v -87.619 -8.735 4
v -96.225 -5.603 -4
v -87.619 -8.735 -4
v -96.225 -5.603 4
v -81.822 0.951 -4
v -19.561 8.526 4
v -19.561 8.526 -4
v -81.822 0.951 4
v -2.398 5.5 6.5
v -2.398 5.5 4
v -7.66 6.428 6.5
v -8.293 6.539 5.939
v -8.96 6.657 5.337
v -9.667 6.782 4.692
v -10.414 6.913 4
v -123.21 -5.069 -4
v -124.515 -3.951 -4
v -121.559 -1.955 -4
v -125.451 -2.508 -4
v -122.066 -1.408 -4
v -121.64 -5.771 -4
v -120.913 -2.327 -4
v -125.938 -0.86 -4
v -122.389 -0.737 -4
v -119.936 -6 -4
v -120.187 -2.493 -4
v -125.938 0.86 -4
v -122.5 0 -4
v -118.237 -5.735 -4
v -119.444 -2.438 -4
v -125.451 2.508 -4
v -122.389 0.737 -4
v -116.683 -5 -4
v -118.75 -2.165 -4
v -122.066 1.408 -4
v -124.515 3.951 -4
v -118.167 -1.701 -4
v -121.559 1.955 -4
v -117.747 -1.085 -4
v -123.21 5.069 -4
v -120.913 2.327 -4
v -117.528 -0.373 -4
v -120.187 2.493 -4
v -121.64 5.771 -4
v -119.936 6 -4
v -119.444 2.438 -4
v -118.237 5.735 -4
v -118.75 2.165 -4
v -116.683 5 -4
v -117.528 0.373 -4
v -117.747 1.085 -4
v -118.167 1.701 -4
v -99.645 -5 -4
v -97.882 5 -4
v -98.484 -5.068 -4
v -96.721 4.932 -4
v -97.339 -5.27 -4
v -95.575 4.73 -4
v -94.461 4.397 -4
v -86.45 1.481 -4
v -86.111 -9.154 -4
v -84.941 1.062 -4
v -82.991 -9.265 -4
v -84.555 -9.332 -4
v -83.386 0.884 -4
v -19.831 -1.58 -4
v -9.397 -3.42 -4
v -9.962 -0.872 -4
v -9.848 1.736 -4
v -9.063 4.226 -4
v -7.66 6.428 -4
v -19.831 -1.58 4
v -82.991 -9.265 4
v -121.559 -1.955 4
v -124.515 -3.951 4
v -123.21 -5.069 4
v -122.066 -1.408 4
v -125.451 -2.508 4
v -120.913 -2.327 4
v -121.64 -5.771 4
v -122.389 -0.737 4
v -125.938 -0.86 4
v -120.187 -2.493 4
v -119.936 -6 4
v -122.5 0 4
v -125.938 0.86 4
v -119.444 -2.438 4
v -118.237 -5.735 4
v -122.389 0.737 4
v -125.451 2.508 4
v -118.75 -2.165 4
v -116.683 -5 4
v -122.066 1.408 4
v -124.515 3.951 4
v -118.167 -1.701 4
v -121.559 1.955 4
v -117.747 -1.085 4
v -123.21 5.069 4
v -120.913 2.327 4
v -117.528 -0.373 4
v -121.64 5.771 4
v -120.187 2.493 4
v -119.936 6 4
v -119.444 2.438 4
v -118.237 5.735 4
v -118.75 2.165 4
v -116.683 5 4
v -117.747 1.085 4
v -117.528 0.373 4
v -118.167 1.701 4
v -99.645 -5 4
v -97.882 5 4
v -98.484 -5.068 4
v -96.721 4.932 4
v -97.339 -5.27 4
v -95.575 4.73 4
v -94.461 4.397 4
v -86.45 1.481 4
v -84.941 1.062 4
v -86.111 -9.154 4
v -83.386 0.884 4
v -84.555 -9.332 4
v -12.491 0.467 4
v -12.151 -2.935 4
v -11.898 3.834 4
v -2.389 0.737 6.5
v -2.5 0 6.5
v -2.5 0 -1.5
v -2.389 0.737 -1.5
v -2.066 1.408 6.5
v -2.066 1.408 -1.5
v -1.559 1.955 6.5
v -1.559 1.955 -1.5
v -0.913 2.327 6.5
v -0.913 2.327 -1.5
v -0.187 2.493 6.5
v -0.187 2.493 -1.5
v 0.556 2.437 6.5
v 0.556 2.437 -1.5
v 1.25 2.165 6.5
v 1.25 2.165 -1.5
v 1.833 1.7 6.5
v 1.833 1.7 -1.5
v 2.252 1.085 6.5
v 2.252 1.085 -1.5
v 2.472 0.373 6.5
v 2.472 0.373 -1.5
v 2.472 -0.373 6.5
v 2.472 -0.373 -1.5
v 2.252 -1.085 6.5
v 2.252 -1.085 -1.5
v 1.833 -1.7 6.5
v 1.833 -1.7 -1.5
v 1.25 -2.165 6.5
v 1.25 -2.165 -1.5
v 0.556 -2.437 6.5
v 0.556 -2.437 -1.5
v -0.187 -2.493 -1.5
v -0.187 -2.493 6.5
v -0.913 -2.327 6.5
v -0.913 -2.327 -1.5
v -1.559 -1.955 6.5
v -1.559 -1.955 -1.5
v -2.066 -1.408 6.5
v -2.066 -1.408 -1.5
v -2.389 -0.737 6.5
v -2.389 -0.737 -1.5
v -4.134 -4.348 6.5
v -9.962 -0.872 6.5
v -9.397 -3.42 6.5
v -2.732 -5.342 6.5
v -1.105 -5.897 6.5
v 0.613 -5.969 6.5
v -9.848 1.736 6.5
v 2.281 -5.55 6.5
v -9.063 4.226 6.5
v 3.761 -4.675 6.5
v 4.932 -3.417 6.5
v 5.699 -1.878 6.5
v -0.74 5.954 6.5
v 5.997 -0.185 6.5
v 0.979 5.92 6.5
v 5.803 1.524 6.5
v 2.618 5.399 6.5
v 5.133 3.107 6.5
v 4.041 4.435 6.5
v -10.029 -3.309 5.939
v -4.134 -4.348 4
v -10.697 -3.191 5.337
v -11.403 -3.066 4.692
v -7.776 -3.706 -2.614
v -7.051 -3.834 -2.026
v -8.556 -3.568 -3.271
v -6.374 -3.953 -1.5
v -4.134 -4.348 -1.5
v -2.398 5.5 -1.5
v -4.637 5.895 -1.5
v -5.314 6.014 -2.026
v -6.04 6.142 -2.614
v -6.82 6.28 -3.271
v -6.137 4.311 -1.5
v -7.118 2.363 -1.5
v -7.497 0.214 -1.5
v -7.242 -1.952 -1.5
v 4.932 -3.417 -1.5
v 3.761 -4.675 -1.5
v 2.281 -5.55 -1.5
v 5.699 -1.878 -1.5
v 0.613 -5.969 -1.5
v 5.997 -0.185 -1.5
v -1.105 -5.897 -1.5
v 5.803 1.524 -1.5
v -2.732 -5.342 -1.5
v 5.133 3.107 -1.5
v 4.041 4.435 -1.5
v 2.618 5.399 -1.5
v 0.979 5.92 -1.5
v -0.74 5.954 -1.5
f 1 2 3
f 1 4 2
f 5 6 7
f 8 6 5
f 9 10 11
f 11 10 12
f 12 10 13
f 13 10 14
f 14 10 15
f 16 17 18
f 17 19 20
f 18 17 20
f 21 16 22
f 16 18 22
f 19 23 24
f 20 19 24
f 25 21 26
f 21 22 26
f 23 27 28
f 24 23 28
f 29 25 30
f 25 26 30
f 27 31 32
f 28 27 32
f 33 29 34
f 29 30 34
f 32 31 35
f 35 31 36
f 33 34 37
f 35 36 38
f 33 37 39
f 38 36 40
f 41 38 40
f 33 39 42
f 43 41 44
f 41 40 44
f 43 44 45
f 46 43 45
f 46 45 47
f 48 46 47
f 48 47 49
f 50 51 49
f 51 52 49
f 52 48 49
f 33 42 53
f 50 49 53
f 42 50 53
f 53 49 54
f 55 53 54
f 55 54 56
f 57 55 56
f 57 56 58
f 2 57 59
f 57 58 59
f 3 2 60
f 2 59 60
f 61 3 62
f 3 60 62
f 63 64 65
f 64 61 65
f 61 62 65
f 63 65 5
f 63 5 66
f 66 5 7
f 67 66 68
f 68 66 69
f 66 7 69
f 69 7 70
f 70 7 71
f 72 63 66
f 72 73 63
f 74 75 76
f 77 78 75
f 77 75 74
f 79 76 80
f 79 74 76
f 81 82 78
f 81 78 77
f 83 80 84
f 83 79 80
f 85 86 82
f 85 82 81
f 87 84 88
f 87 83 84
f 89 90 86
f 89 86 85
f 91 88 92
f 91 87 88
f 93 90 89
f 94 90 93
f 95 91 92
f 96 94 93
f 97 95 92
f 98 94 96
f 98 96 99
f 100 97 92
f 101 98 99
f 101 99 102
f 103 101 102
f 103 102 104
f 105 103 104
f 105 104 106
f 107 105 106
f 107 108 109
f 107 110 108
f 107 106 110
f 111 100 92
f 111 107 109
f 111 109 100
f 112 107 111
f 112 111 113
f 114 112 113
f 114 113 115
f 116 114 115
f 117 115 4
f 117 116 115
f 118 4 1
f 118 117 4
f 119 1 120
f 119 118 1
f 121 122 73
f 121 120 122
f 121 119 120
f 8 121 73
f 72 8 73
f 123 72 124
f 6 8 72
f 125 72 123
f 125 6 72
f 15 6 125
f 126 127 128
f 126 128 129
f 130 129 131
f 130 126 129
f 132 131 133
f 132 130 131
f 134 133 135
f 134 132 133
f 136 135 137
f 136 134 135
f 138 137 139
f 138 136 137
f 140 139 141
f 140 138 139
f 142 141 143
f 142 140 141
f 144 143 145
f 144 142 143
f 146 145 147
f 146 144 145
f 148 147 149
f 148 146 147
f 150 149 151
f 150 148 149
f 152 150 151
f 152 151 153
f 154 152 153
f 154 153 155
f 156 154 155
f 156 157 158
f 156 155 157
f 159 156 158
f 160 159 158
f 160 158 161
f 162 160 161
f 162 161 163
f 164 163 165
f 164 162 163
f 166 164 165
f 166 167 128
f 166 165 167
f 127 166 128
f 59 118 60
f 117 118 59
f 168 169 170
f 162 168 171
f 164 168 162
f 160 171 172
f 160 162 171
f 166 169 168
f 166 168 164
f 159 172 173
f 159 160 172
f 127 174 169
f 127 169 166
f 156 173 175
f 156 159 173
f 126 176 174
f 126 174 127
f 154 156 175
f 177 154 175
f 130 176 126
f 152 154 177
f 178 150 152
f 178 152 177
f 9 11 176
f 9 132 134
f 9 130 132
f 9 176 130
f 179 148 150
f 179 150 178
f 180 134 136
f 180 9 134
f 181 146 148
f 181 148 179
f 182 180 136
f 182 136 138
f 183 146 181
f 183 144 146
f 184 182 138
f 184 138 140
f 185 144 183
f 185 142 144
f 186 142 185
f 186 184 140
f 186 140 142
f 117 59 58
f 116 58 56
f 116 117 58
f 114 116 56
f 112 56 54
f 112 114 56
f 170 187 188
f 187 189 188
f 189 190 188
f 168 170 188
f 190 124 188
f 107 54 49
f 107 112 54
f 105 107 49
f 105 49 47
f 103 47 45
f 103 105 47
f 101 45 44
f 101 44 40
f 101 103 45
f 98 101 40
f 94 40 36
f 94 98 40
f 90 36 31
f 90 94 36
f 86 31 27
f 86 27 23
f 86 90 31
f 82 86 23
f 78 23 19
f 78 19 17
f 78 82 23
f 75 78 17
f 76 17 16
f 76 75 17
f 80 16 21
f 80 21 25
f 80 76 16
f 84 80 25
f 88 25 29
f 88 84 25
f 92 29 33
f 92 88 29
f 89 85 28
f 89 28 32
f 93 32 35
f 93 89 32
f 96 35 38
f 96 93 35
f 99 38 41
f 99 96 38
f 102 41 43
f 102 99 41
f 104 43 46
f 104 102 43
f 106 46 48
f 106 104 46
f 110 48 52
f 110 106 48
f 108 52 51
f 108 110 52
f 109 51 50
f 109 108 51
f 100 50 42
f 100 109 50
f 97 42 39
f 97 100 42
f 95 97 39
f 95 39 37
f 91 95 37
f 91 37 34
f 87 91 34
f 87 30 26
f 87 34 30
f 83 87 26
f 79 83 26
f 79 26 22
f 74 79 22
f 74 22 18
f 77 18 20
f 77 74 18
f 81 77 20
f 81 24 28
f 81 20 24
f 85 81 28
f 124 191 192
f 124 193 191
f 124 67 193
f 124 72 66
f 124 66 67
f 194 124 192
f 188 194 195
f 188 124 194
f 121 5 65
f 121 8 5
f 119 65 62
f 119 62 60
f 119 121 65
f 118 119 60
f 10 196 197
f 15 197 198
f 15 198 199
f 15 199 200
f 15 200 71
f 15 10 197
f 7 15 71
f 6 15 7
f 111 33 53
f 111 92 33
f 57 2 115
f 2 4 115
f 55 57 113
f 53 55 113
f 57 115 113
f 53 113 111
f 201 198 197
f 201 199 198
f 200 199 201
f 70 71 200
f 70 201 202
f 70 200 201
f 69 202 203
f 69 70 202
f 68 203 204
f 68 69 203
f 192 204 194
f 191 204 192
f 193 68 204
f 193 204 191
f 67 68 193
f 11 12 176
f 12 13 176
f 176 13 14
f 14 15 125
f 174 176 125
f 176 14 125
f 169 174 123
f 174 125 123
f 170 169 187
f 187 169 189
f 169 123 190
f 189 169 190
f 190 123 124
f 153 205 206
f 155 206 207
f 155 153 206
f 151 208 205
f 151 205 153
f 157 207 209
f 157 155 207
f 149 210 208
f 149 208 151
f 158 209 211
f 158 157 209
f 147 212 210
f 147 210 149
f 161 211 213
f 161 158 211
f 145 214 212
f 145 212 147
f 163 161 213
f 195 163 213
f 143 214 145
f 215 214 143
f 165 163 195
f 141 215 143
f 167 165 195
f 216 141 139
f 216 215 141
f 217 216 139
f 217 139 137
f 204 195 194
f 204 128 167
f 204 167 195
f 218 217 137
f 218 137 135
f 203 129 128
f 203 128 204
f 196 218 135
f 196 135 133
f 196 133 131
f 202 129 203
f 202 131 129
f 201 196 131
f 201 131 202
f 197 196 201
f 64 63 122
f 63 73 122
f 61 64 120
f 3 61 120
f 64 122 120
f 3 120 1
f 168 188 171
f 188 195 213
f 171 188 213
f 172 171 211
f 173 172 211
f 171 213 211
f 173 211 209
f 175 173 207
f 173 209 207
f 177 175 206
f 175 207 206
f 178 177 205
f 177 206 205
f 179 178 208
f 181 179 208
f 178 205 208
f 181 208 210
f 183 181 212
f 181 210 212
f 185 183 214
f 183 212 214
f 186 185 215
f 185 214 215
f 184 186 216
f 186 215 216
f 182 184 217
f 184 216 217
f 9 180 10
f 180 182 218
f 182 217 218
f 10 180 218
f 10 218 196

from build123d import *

# Parameters (mm, degrees)
EXTRUDE_1_DEPTH          = 4
SKETCH_2_R               = 10
CUT_EXTRUDE_1_DEPTH      = 2.5
EXTRUDE_4_DEPTH          = 2.5
CUT_EXTRUDE_2_DEPTH      = 127.614708745
CUT_EXTRUDE_2_DEPTH_BACK = 127.614708745
SKETCH_4_R               = 2.5
SKETCH_4_R_2             = 2.500304397
CHAMFER_1_SIZE           = 2.5
CHAMFER_2_SIZE           = 2.5
FILLET_1_R               = 10


with BuildPart() as part:
    # 草图1 → 凸台-拉伸1 (new, symmetric)
    with BuildSketch(Plane.XY):
        with BuildLine():
            Line((-2.397996919, 5.499964616), (-19.561052391, 8.526274367))
            Line((-19.561052391, 8.526274367), (-84.199167791, 0.661766964))
            Line((-84.199167791, 0.661766964), (-96.118365096, 5))
            Line((-96.118365096, 5), (-116.68337521, 5))
            ThreePointArc((-116.68337521, 5), (-126, 0), (-116.68337521, -5))
            Line((-116.68337521, -5), (-97.881634904, -5))
            Line((-97.881634904, -5), (-85.368824069, -9.554290691))
            Line((-85.368824069, -9.554290691), (-19.831257729, -1.58034726))
            Line((-19.831257729, -1.58034726), (-4.134478696, -4.348112914))
            ThreePointArc((-4.134478696, -4.348112914), (5.908846518, -1.041889066), (-2.397996919, 5.499964616))
        make_face()
    extrude(amount=EXTRUDE_1_DEPTH, both=True)

    # 草图2 → 切除-拉伸1 (cut)
    with BuildSketch(Plane(origin=(0, 0, -4), x_dir=(-1, 0, 0), z_dir=(0, 0, -1))):
        Circle(SKETCH_2_R)
    extrude(amount=-CUT_EXTRUDE_1_DEPTH, mode=Mode.SUBTRACT)

    # 草图3 → 凸台-拉伸4 (add)
    with BuildSketch(Plane.XY.offset(4)):
        with BuildLine():
            Line((-2.397996919, 5.499964616), (-7.660444431, 6.427876097))
            ThreePointArc((-7.660444431, 6.427876097), (-9.84807753, 1.736481777), (-9.396926208, -3.420201433))
            Line((-9.396926208, -3.420201433), (-4.134478696, -4.348112914))
            ThreePointArc((-4.134478696, -4.348112914), (5.908846518, -1.041889066), (-2.397996919, 5.499964616))
        make_face()
    extrude(amount=EXTRUDE_4_DEPTH)

    # 草图4 → 切除-拉伸2 (cut, two sides: drawn at the far end of the back side and taken through both)
    with BuildSketch(Plane(origin=(0, 0, -1.5), x_dir=(-1, 0, 0), z_dir=(0, 0, -1)).offset(-CUT_EXTRUDE_2_DEPTH_BACK)):
        Circle(SKETCH_4_R)
        with Locations((120, 0)):
            Circle(SKETCH_4_R_2)
    extrude(amount=CUT_EXTRUDE_2_DEPTH + CUT_EXTRUDE_2_DEPTH_BACK, mode=Mode.SUBTRACT)

    # 倒角1
    chamfer_1_edges = [part.edges().sort_by_distance(p)[0] for p in [
        (-9.84807753, 1.736481777, 4),
    ]]
    chamfer(chamfer_1_edges, length=CHAMFER_1_SIZE - 0.0001)  # a hair under: the kernel refuses the full size

    # 倒角2
    chamfer_2_edges = [part.edges().sort_by_distance(p)[0] for p in [
        (-9.84807753, 1.736481777, -1.5),
    ]]
    chamfer(chamfer_2_edges, length=CHAMFER_2_SIZE - 0.0001)  # a hair under: the kernel refuses the full size

    # 圆角1
    fillet_1_edges = [part.edges().sort_by_distance(p)[0] for p in [
        (-85.368824069, -9.554290691, 0),
        (-97.881634904, -5, 0),
        (-96.118365096, 5, 0),
        (-84.199167791, 0.661766964, 0),
    ]]
    fillet(fillet_1_edges, radius=FILLET_1_R)


solid = part.part
